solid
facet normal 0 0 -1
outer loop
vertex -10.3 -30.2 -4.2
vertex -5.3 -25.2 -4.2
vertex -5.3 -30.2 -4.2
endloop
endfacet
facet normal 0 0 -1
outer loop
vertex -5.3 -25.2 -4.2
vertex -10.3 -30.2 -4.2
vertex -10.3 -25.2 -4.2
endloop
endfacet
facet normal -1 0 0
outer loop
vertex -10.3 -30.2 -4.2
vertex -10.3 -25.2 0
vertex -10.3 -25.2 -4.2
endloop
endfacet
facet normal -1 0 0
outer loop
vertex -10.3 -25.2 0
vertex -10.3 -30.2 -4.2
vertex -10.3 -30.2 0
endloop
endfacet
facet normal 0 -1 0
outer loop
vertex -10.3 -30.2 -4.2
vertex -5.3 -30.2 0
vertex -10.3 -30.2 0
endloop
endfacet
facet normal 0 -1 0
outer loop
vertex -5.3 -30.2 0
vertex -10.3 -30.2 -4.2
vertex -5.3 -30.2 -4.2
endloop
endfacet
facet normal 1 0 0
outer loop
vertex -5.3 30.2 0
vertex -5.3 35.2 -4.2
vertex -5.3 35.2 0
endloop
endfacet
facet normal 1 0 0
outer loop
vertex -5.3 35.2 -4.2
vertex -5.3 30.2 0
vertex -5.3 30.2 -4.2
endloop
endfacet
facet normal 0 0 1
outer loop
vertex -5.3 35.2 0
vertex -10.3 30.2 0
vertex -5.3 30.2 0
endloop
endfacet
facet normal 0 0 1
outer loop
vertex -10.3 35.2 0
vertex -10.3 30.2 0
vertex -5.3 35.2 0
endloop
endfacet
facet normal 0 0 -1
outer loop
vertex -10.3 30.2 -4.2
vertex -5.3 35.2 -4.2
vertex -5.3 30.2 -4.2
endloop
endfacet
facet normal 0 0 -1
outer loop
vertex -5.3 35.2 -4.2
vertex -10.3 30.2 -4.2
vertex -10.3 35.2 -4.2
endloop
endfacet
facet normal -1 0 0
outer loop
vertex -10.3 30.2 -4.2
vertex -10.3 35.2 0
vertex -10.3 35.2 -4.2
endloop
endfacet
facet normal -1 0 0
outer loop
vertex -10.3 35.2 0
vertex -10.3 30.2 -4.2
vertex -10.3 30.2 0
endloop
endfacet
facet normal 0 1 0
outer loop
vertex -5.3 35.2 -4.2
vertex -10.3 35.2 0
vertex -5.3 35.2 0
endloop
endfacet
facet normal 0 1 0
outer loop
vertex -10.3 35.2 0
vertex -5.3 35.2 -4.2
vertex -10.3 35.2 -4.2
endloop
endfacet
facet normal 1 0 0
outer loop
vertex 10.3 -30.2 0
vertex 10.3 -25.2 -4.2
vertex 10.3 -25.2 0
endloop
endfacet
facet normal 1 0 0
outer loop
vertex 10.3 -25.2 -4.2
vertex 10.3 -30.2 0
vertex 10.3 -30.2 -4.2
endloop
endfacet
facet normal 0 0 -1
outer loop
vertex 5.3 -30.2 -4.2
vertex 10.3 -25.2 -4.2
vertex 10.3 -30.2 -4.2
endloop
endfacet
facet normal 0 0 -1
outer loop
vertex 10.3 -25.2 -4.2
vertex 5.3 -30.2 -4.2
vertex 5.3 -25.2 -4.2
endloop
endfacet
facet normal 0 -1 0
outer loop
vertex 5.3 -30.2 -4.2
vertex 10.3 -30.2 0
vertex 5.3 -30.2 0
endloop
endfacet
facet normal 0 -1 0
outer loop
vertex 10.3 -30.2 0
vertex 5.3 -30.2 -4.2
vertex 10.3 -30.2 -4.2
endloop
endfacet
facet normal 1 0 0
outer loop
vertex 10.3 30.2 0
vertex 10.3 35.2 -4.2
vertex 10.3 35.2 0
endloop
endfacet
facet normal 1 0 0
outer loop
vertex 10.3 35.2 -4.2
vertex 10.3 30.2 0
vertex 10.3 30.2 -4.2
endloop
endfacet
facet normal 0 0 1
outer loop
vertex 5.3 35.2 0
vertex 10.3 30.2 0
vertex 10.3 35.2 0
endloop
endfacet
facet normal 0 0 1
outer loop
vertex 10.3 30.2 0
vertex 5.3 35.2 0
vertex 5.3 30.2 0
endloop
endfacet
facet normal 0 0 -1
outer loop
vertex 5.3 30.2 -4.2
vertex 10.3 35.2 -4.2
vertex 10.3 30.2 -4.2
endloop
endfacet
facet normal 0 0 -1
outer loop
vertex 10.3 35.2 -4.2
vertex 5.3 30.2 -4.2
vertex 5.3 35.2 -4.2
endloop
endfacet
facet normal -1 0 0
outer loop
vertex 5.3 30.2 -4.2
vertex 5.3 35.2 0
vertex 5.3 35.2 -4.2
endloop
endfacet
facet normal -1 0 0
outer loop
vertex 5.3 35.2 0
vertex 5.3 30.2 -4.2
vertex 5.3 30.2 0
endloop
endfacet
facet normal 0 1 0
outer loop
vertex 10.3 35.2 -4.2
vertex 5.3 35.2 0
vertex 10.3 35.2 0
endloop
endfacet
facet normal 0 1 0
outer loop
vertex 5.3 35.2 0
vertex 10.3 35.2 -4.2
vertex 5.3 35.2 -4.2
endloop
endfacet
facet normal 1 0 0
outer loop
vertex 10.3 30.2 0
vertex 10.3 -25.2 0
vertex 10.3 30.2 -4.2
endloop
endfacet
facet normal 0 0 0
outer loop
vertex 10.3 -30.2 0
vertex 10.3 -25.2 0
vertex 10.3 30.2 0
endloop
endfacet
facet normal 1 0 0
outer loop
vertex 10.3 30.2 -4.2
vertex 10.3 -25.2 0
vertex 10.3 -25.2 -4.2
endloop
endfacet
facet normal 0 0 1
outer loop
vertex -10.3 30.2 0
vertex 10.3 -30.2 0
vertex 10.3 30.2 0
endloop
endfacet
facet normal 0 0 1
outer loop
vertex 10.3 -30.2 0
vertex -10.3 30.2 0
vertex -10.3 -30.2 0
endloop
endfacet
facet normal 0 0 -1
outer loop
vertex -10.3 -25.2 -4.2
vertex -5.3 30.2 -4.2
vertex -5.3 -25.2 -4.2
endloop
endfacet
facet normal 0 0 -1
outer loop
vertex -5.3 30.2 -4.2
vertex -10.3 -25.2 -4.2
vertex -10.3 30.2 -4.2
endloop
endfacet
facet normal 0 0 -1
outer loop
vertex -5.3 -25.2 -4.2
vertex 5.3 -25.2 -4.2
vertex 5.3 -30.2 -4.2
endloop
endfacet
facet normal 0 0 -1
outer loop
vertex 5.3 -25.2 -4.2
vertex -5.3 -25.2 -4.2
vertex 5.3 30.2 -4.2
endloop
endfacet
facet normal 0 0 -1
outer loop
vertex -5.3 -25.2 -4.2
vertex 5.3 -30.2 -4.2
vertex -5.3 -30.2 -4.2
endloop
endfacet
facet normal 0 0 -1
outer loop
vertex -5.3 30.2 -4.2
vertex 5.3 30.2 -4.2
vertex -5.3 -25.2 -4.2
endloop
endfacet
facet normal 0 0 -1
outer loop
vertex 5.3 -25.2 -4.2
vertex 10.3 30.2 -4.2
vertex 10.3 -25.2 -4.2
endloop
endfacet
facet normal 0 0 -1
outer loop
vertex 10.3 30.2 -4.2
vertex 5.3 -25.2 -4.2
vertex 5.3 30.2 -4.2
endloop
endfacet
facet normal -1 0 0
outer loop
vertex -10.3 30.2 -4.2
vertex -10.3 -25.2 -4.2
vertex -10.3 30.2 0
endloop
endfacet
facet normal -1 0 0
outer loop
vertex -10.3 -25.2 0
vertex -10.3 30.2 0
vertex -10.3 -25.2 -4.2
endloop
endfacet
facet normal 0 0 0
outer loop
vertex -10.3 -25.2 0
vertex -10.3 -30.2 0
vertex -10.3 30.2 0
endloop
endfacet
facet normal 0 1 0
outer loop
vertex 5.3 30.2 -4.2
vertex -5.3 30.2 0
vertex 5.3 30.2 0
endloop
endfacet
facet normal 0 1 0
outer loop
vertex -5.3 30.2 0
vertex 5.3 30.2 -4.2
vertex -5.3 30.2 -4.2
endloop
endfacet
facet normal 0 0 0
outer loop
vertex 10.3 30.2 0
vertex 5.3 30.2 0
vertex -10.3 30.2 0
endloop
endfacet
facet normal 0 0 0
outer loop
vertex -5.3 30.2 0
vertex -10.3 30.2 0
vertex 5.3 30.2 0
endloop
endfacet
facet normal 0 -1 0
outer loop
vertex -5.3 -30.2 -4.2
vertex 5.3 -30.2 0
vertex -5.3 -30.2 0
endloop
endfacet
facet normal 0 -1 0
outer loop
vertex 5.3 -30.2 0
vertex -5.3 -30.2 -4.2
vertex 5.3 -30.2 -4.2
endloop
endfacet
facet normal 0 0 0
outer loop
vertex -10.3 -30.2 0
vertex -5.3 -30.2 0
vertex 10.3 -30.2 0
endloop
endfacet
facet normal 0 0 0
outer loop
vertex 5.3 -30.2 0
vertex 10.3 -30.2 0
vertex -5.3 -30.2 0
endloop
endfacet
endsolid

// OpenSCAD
module arrow_indicator() {
    // Main body
    translate([-10.3, -30.2, -4.2])
    cube([20.6, 60.4, 4.2]);

    // Left tip
    translate([-10.3, -30.2, -4.2])
    polyhedron(
        points=[
            [0, 0, 0], [0, 60.4, 0], [0, 30.2, 4.2],
            [-5, 0, 0], [-5, 60.4, 0], [-5, 30.2, 4.2]
        ],
        faces=[
            [0, 1, 2], [3, 4, 5], [0, 1, 4, 3], [1, 2, 5, 4], [2, 0, 3, 5]
        ]
    );

    // Right tip
    translate([5.3, -30.2, -4.2])
    polyhedron(
        points=[
            [0, 0, 0], [0, 60.4, 0], [0, 30.2, 4.2],
            [5, 0, 0], [5, 60.4, 0], [5, 30.2, 4.2]
        ],
        faces=[
            [0, 1, 2], [3, 4, 5], [0, 1, 4, 3], [1, 2, 5, 4], [2, 0, 3, 5]
        ]
    );

    // Left fins
    translate([-10.3, -30.2, -4.2])
    for (i = [0, 1]) {
        translate([0, i * 60.4, 0])
        cube([5, 5, 4.2]);
    }

    // Right fins
    translate([5.3, -30.2, -4.2])
    for (i = [0, 1]) {
        translate([0, i * 60.4, 0])
        cube([5, 5, 4.2]);
    }
}

arrow_indicator();
